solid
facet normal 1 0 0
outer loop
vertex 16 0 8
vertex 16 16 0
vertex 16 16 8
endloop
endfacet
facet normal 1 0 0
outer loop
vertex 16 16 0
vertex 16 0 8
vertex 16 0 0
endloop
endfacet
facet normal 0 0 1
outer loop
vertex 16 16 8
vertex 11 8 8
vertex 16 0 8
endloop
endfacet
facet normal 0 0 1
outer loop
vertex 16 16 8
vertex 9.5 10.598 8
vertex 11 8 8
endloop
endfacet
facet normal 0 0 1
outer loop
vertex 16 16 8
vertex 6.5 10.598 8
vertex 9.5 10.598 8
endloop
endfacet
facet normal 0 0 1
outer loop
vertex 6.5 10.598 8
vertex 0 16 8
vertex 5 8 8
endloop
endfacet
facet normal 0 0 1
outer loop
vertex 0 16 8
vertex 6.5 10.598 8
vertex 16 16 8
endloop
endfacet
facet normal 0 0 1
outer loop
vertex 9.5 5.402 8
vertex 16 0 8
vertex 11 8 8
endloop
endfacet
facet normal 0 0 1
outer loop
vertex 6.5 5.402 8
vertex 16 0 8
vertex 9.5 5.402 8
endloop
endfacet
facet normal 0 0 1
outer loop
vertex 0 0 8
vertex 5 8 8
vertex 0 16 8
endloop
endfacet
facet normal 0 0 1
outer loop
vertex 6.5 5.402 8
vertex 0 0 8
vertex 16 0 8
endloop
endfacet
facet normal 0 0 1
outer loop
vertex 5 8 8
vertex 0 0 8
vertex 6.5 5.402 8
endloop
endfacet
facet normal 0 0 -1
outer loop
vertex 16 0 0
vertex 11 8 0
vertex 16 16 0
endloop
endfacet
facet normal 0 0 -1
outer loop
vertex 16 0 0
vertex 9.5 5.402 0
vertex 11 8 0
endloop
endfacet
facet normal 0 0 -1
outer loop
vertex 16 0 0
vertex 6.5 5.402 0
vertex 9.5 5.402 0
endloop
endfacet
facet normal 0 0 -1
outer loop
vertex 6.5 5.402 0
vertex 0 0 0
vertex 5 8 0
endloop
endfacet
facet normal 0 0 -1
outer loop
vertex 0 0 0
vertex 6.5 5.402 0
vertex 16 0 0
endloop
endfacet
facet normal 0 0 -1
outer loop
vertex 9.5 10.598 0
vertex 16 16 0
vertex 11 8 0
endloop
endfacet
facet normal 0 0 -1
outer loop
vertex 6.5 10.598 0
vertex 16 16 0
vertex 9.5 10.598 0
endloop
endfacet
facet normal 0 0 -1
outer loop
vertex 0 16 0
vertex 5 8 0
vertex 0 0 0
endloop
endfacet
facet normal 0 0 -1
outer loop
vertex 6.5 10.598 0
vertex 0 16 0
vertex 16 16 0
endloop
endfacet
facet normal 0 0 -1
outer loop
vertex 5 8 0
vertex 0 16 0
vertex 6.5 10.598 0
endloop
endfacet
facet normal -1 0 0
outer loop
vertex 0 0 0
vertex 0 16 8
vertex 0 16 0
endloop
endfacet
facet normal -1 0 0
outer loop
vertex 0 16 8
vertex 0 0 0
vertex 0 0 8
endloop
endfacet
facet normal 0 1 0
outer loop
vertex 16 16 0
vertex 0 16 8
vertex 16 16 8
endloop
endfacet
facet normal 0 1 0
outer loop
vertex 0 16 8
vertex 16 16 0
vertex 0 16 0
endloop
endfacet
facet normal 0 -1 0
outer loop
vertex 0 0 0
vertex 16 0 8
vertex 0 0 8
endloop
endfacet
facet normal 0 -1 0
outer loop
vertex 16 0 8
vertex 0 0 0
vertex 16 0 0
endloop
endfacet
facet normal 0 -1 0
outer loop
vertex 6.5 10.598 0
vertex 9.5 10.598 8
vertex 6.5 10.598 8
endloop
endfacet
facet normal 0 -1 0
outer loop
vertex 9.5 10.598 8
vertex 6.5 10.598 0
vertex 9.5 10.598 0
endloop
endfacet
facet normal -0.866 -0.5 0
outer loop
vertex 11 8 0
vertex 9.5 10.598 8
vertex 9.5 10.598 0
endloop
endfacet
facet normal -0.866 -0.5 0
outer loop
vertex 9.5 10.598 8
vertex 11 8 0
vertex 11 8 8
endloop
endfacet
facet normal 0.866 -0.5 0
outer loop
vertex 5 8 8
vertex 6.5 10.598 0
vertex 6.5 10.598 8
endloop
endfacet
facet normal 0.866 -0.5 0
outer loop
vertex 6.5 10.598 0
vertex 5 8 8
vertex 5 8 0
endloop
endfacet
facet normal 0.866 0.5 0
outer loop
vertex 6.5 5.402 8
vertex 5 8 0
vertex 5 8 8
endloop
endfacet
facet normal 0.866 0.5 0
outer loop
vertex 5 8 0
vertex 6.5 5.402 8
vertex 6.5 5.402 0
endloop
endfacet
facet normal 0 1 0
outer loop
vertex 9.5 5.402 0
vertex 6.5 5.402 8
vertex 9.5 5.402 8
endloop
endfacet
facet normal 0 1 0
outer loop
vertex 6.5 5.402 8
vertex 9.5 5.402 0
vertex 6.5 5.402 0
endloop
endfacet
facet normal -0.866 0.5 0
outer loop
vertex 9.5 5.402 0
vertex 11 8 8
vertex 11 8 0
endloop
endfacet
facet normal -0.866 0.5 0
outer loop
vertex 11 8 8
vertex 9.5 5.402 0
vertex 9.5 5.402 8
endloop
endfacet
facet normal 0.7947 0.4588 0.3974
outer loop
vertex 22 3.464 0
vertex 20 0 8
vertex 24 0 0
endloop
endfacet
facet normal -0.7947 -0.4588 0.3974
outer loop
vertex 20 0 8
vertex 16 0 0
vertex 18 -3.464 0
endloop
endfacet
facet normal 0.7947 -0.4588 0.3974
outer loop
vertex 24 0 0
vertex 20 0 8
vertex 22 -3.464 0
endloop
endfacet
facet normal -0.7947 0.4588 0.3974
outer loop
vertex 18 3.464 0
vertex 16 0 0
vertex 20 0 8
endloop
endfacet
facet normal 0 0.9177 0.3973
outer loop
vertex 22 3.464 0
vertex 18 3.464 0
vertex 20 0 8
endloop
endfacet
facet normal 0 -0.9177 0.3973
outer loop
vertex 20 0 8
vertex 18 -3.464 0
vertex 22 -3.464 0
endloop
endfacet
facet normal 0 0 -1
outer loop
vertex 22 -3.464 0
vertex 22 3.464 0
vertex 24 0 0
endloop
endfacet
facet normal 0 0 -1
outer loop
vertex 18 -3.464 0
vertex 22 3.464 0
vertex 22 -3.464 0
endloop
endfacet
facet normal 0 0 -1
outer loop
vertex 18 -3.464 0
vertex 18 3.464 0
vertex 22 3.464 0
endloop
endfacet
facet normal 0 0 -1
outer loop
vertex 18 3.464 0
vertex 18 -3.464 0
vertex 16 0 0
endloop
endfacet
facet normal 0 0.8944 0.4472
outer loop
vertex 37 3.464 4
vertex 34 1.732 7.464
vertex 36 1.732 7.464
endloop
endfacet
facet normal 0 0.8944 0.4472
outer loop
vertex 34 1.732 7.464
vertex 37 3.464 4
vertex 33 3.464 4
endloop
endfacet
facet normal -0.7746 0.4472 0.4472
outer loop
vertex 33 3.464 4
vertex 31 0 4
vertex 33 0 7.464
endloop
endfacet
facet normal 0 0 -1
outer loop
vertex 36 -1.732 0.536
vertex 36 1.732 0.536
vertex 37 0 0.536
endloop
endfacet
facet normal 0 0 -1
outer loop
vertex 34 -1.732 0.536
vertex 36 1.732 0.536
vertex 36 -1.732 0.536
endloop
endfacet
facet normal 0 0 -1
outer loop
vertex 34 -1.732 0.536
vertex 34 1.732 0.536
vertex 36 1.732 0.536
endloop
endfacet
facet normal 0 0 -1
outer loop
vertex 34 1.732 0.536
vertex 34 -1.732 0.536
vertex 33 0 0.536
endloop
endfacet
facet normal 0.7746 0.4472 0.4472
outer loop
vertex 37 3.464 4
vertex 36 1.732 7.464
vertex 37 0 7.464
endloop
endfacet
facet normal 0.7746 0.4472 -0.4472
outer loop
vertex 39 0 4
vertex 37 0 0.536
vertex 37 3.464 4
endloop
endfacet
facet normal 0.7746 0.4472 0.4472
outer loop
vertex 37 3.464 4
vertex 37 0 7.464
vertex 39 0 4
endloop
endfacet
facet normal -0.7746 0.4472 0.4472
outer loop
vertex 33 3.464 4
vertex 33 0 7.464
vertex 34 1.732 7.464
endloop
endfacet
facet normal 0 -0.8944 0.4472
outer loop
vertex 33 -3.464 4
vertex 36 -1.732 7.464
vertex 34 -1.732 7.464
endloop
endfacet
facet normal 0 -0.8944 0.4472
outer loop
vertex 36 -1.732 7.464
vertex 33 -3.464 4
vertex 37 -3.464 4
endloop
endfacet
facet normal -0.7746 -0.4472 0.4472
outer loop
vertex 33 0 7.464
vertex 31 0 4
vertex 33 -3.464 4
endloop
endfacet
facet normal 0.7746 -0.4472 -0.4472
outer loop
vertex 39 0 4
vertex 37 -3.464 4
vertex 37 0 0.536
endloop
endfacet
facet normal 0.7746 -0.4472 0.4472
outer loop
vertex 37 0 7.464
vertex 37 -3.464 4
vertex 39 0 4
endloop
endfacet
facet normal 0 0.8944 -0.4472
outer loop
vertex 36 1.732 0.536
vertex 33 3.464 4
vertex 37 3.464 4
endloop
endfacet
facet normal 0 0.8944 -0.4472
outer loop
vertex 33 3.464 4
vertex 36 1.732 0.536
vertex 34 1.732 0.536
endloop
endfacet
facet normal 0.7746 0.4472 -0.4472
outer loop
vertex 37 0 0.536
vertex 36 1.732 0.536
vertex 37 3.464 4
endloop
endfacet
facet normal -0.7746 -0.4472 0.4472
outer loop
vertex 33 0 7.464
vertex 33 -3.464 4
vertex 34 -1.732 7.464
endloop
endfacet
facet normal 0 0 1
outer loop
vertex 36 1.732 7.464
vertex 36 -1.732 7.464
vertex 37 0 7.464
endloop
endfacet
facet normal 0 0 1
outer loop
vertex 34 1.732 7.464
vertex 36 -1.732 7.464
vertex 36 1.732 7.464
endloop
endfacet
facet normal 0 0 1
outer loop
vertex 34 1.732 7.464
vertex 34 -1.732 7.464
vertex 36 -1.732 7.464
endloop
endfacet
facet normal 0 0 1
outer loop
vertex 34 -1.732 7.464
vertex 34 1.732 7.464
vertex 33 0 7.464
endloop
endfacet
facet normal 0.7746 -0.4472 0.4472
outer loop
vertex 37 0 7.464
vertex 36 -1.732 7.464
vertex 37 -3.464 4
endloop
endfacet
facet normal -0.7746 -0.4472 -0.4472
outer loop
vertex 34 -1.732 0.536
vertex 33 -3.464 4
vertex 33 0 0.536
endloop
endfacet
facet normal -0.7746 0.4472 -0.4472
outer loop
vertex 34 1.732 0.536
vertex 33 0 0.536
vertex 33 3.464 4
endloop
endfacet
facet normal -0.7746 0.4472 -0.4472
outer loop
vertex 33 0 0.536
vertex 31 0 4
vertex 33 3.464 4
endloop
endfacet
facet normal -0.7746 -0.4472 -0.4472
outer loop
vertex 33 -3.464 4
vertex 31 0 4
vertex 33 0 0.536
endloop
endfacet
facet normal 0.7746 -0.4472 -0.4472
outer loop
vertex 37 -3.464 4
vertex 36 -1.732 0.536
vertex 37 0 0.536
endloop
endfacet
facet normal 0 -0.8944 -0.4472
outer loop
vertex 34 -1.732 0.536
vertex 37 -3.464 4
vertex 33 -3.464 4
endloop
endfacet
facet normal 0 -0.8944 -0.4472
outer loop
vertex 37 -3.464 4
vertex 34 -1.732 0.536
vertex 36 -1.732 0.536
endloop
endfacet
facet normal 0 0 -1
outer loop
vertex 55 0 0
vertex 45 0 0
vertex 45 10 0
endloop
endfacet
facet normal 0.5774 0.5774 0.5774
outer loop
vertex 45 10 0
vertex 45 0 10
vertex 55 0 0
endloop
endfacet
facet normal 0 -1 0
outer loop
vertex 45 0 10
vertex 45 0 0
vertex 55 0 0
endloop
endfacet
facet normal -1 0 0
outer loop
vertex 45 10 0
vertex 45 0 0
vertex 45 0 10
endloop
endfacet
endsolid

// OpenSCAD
difference() {
  cube([16, 16, 8]);
  translate([8, 8, -1]) cylinder(r=3, h=10, $fn=6);
}
translate([20, 0, 0]) cylinder(r1=4, r2=0, h=8, $fn=6);
translate([35, 0, 4]) sphere(r=4, $fn=6);
translate([45, 0, 0]) polyhedron(
  points=[[0,0,0], [10,0,0], [0,10,0], [0,0,10]],
  faces=[[0,1,2], [0,3,1], [0,2,3], [1,3,2]]
);
